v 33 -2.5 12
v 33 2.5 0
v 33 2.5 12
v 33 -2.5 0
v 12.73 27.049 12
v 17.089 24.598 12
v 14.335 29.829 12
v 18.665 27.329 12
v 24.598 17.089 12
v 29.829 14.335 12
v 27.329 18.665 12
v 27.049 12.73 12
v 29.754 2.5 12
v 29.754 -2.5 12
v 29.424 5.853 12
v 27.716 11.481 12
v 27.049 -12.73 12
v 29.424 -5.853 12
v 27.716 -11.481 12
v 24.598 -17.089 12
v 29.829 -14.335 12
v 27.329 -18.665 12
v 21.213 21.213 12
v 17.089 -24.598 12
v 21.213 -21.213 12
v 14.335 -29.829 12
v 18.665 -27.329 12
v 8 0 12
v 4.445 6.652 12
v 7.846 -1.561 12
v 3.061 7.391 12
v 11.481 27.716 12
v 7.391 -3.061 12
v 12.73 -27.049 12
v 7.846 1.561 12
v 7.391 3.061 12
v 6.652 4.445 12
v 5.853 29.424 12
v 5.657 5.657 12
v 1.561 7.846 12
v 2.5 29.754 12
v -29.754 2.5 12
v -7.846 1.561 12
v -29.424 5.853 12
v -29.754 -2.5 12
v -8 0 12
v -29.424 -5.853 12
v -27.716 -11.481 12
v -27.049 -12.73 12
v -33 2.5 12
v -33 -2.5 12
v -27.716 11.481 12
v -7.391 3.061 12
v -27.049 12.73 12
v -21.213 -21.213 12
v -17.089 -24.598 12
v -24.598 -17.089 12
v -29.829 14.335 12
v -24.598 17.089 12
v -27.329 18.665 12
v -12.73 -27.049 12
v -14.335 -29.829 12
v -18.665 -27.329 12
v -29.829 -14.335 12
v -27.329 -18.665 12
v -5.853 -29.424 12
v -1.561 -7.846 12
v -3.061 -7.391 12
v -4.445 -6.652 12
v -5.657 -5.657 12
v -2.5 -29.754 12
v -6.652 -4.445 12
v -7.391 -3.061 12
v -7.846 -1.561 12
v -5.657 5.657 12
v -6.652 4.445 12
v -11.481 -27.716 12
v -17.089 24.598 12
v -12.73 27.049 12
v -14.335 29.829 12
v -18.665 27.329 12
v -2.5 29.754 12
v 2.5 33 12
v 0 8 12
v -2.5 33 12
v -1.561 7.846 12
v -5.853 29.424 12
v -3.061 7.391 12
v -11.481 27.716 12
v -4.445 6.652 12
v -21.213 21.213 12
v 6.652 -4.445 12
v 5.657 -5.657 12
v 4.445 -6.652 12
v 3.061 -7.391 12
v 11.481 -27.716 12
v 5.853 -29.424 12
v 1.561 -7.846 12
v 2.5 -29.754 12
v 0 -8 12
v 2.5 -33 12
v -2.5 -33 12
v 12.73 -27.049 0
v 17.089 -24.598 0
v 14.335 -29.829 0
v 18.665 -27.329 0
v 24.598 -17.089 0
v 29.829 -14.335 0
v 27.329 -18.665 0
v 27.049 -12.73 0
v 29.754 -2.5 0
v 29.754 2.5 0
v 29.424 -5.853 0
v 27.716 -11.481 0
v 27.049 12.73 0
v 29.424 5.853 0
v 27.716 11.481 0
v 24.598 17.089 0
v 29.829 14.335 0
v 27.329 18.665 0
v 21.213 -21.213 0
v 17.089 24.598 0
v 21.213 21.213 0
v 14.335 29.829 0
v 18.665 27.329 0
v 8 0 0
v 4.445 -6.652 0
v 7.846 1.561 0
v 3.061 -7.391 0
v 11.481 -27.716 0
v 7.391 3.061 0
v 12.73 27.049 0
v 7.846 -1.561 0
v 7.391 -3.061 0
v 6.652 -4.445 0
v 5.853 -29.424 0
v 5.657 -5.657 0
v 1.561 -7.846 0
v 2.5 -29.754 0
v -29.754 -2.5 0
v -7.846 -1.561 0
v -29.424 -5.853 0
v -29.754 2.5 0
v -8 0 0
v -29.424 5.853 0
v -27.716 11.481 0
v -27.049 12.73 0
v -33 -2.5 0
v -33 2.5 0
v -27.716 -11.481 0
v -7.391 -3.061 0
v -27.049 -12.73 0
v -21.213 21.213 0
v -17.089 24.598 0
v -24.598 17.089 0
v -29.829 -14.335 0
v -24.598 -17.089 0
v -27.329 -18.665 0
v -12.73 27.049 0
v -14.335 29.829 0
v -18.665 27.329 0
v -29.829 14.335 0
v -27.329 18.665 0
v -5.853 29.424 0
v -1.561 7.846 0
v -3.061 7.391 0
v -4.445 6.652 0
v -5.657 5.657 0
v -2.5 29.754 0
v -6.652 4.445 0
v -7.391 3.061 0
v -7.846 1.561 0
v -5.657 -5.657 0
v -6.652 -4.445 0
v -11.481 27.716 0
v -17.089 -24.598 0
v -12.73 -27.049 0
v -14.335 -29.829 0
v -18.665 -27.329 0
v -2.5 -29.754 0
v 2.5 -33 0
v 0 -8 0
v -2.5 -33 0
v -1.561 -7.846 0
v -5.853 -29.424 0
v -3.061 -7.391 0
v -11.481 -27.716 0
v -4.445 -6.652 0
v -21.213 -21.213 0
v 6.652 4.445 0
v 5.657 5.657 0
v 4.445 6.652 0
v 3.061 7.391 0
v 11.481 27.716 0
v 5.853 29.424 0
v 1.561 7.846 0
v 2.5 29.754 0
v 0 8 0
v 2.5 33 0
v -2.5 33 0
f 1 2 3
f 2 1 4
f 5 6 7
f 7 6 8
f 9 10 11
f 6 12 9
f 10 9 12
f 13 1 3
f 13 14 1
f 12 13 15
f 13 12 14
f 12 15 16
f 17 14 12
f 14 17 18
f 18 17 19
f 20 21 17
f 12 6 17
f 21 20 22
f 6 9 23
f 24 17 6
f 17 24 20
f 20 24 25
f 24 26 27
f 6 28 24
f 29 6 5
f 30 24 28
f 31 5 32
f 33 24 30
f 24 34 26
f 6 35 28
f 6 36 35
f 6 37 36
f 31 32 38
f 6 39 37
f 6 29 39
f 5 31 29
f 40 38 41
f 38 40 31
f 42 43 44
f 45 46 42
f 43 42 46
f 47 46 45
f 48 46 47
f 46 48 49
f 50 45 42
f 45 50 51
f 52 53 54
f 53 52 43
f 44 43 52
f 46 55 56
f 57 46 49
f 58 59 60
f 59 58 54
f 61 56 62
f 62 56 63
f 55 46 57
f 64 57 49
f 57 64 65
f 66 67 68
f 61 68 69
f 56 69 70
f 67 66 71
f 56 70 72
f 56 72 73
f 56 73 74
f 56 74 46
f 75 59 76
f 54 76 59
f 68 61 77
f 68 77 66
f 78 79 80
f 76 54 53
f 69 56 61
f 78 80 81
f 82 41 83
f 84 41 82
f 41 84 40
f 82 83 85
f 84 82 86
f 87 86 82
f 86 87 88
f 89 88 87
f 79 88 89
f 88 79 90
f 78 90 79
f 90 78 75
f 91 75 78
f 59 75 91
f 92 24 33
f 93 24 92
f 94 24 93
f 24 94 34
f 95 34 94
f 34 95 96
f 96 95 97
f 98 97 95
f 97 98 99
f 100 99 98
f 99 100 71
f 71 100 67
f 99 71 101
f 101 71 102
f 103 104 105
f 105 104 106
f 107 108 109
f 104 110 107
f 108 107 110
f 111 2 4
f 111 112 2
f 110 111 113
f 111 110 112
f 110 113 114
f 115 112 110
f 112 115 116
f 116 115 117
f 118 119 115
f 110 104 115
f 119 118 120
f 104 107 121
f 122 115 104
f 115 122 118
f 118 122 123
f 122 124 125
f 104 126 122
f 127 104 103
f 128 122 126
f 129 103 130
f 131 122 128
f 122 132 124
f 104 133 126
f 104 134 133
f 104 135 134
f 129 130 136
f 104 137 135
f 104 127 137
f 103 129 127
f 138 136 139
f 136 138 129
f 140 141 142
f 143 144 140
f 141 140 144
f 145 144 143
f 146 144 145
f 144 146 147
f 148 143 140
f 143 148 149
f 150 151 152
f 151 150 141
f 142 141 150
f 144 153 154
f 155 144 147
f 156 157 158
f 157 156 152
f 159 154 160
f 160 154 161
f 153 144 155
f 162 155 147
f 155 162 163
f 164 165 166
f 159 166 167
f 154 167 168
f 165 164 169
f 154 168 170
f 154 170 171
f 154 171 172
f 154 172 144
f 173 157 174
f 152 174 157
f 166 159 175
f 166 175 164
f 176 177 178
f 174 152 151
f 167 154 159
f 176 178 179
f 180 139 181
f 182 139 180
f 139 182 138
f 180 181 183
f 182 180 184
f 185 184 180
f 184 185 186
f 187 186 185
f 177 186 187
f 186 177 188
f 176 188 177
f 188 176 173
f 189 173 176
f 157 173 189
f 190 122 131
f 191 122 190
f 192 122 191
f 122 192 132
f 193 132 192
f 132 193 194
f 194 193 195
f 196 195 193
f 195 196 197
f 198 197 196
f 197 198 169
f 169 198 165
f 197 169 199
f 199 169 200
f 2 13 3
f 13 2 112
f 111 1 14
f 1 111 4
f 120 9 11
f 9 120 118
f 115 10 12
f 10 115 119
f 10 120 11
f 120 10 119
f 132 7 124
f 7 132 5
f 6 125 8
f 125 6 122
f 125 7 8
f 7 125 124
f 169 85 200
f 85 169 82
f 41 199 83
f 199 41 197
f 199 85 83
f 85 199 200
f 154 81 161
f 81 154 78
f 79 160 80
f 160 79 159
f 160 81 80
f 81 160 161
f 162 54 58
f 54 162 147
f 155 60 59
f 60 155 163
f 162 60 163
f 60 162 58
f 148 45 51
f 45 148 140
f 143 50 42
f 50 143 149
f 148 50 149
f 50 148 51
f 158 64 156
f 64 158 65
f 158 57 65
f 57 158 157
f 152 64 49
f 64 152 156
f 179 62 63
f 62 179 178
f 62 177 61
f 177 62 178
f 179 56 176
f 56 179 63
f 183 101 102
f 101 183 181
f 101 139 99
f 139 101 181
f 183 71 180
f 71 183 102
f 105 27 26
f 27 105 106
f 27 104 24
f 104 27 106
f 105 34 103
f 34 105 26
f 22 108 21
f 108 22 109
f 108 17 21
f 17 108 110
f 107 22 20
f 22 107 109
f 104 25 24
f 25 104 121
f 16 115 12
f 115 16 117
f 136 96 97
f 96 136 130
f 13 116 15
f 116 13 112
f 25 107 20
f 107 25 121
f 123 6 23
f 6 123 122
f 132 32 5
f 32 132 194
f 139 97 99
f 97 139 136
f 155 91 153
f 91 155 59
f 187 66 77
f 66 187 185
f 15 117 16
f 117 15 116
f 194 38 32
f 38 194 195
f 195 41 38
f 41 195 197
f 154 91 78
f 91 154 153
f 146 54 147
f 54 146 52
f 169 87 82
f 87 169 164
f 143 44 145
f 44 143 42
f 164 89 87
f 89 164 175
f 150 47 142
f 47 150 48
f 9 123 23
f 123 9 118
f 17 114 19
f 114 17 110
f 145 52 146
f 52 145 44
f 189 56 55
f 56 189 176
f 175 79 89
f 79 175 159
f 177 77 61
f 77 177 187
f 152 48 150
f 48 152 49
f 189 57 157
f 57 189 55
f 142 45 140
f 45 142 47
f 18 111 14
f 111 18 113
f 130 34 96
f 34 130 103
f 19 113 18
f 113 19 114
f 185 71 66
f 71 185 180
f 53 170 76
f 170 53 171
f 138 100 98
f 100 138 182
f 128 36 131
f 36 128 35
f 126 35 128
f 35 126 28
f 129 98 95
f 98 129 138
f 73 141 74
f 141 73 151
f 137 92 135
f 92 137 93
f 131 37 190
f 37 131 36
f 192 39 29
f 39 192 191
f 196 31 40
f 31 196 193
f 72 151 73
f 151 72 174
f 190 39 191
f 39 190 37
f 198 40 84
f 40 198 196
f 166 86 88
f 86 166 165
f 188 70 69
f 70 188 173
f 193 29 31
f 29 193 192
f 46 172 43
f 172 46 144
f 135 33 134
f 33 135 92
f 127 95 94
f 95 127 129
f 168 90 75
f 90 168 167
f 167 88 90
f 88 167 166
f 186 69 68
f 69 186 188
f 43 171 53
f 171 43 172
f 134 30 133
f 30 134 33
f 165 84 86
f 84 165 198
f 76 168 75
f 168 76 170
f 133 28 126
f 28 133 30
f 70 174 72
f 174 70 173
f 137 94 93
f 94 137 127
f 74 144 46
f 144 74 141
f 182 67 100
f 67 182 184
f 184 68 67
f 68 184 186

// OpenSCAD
$fn = 32;

// ----------------------------------------------------------------------
// Spur blank: bored gear blank
// ----------------------------------------------------------------------

// --- parameters (mm) ---
disc_r = 30;              // blank root radius
disc_t = 12;              // blank thickness
n_teeth = 12;             // stub tooth count
tooth_w = 5;              // tooth width at the root
tooth_h = 3;              // tooth height above the root
bore_r = 8;               // central bore radius

out_r = disc_r + tooth_h;  // tip radius
bbox_x = 66.0;  // measured width over the teeth
bbox_y = 66.0;  // measured depth over the teeth

difference() {
union() {
  cylinder(r = disc_r, h = disc_t);
  for (i = [0 : n_teeth - 1])
    rotate([0, 0, i * 360 / n_teeth])
      translate([disc_r - 1, -tooth_w / 2, 0])
        cube([tooth_h + 1, tooth_w, disc_t]);
}
  translate([0, 0, -1]) cylinder(r = bore_r, h = disc_t + 2);
}
